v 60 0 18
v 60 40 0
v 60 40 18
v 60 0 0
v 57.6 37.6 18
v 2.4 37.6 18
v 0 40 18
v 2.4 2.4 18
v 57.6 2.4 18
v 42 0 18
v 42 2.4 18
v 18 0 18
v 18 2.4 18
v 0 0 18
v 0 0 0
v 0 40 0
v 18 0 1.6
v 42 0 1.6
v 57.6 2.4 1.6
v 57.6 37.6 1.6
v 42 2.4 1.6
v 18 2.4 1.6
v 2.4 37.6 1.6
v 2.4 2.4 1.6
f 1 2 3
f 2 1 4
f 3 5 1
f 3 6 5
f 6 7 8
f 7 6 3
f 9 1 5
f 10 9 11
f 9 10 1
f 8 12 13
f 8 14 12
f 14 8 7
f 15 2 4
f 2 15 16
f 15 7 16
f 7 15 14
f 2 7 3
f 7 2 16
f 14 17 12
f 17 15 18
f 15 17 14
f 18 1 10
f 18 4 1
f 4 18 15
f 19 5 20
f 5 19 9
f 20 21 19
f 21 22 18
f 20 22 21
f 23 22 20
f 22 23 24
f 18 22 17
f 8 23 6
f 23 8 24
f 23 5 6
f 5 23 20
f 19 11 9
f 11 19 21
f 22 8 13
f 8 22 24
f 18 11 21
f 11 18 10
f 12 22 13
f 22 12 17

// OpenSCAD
// A coin tray with a scoop in its front wall for the fingers. defect=true stands a fin right
// behind the scoop, where the fingers go.
defect = false;
size = [60, 40, 18];
wall = 2.4;
floor_t = 1.6;
scoop = 24;

echo(cadverify_spec = [
    ["bounds", [[0, 0, 0], size]],
    ["bodies", 1],
    ["through_holes", 0],
    ["material", "PLA"]
]);

difference() {
    cube(size);
    translate([wall, wall, floor_t]) cube([size[0] - 2 * wall, size[1] - 2 * wall, size[2]]);
    // the scoop: an open notch in the front wall, down to the floor
    translate([size[0] / 2 - scoop / 2, -1, floor_t]) cube([scoop, wall + 2, size[2]]);
}
if (defect)
    translate([size[0] / 2 - scoop / 2 - 2, wall + 1.5, 0]) cube([scoop + 4, 1.6, size[2]]);
